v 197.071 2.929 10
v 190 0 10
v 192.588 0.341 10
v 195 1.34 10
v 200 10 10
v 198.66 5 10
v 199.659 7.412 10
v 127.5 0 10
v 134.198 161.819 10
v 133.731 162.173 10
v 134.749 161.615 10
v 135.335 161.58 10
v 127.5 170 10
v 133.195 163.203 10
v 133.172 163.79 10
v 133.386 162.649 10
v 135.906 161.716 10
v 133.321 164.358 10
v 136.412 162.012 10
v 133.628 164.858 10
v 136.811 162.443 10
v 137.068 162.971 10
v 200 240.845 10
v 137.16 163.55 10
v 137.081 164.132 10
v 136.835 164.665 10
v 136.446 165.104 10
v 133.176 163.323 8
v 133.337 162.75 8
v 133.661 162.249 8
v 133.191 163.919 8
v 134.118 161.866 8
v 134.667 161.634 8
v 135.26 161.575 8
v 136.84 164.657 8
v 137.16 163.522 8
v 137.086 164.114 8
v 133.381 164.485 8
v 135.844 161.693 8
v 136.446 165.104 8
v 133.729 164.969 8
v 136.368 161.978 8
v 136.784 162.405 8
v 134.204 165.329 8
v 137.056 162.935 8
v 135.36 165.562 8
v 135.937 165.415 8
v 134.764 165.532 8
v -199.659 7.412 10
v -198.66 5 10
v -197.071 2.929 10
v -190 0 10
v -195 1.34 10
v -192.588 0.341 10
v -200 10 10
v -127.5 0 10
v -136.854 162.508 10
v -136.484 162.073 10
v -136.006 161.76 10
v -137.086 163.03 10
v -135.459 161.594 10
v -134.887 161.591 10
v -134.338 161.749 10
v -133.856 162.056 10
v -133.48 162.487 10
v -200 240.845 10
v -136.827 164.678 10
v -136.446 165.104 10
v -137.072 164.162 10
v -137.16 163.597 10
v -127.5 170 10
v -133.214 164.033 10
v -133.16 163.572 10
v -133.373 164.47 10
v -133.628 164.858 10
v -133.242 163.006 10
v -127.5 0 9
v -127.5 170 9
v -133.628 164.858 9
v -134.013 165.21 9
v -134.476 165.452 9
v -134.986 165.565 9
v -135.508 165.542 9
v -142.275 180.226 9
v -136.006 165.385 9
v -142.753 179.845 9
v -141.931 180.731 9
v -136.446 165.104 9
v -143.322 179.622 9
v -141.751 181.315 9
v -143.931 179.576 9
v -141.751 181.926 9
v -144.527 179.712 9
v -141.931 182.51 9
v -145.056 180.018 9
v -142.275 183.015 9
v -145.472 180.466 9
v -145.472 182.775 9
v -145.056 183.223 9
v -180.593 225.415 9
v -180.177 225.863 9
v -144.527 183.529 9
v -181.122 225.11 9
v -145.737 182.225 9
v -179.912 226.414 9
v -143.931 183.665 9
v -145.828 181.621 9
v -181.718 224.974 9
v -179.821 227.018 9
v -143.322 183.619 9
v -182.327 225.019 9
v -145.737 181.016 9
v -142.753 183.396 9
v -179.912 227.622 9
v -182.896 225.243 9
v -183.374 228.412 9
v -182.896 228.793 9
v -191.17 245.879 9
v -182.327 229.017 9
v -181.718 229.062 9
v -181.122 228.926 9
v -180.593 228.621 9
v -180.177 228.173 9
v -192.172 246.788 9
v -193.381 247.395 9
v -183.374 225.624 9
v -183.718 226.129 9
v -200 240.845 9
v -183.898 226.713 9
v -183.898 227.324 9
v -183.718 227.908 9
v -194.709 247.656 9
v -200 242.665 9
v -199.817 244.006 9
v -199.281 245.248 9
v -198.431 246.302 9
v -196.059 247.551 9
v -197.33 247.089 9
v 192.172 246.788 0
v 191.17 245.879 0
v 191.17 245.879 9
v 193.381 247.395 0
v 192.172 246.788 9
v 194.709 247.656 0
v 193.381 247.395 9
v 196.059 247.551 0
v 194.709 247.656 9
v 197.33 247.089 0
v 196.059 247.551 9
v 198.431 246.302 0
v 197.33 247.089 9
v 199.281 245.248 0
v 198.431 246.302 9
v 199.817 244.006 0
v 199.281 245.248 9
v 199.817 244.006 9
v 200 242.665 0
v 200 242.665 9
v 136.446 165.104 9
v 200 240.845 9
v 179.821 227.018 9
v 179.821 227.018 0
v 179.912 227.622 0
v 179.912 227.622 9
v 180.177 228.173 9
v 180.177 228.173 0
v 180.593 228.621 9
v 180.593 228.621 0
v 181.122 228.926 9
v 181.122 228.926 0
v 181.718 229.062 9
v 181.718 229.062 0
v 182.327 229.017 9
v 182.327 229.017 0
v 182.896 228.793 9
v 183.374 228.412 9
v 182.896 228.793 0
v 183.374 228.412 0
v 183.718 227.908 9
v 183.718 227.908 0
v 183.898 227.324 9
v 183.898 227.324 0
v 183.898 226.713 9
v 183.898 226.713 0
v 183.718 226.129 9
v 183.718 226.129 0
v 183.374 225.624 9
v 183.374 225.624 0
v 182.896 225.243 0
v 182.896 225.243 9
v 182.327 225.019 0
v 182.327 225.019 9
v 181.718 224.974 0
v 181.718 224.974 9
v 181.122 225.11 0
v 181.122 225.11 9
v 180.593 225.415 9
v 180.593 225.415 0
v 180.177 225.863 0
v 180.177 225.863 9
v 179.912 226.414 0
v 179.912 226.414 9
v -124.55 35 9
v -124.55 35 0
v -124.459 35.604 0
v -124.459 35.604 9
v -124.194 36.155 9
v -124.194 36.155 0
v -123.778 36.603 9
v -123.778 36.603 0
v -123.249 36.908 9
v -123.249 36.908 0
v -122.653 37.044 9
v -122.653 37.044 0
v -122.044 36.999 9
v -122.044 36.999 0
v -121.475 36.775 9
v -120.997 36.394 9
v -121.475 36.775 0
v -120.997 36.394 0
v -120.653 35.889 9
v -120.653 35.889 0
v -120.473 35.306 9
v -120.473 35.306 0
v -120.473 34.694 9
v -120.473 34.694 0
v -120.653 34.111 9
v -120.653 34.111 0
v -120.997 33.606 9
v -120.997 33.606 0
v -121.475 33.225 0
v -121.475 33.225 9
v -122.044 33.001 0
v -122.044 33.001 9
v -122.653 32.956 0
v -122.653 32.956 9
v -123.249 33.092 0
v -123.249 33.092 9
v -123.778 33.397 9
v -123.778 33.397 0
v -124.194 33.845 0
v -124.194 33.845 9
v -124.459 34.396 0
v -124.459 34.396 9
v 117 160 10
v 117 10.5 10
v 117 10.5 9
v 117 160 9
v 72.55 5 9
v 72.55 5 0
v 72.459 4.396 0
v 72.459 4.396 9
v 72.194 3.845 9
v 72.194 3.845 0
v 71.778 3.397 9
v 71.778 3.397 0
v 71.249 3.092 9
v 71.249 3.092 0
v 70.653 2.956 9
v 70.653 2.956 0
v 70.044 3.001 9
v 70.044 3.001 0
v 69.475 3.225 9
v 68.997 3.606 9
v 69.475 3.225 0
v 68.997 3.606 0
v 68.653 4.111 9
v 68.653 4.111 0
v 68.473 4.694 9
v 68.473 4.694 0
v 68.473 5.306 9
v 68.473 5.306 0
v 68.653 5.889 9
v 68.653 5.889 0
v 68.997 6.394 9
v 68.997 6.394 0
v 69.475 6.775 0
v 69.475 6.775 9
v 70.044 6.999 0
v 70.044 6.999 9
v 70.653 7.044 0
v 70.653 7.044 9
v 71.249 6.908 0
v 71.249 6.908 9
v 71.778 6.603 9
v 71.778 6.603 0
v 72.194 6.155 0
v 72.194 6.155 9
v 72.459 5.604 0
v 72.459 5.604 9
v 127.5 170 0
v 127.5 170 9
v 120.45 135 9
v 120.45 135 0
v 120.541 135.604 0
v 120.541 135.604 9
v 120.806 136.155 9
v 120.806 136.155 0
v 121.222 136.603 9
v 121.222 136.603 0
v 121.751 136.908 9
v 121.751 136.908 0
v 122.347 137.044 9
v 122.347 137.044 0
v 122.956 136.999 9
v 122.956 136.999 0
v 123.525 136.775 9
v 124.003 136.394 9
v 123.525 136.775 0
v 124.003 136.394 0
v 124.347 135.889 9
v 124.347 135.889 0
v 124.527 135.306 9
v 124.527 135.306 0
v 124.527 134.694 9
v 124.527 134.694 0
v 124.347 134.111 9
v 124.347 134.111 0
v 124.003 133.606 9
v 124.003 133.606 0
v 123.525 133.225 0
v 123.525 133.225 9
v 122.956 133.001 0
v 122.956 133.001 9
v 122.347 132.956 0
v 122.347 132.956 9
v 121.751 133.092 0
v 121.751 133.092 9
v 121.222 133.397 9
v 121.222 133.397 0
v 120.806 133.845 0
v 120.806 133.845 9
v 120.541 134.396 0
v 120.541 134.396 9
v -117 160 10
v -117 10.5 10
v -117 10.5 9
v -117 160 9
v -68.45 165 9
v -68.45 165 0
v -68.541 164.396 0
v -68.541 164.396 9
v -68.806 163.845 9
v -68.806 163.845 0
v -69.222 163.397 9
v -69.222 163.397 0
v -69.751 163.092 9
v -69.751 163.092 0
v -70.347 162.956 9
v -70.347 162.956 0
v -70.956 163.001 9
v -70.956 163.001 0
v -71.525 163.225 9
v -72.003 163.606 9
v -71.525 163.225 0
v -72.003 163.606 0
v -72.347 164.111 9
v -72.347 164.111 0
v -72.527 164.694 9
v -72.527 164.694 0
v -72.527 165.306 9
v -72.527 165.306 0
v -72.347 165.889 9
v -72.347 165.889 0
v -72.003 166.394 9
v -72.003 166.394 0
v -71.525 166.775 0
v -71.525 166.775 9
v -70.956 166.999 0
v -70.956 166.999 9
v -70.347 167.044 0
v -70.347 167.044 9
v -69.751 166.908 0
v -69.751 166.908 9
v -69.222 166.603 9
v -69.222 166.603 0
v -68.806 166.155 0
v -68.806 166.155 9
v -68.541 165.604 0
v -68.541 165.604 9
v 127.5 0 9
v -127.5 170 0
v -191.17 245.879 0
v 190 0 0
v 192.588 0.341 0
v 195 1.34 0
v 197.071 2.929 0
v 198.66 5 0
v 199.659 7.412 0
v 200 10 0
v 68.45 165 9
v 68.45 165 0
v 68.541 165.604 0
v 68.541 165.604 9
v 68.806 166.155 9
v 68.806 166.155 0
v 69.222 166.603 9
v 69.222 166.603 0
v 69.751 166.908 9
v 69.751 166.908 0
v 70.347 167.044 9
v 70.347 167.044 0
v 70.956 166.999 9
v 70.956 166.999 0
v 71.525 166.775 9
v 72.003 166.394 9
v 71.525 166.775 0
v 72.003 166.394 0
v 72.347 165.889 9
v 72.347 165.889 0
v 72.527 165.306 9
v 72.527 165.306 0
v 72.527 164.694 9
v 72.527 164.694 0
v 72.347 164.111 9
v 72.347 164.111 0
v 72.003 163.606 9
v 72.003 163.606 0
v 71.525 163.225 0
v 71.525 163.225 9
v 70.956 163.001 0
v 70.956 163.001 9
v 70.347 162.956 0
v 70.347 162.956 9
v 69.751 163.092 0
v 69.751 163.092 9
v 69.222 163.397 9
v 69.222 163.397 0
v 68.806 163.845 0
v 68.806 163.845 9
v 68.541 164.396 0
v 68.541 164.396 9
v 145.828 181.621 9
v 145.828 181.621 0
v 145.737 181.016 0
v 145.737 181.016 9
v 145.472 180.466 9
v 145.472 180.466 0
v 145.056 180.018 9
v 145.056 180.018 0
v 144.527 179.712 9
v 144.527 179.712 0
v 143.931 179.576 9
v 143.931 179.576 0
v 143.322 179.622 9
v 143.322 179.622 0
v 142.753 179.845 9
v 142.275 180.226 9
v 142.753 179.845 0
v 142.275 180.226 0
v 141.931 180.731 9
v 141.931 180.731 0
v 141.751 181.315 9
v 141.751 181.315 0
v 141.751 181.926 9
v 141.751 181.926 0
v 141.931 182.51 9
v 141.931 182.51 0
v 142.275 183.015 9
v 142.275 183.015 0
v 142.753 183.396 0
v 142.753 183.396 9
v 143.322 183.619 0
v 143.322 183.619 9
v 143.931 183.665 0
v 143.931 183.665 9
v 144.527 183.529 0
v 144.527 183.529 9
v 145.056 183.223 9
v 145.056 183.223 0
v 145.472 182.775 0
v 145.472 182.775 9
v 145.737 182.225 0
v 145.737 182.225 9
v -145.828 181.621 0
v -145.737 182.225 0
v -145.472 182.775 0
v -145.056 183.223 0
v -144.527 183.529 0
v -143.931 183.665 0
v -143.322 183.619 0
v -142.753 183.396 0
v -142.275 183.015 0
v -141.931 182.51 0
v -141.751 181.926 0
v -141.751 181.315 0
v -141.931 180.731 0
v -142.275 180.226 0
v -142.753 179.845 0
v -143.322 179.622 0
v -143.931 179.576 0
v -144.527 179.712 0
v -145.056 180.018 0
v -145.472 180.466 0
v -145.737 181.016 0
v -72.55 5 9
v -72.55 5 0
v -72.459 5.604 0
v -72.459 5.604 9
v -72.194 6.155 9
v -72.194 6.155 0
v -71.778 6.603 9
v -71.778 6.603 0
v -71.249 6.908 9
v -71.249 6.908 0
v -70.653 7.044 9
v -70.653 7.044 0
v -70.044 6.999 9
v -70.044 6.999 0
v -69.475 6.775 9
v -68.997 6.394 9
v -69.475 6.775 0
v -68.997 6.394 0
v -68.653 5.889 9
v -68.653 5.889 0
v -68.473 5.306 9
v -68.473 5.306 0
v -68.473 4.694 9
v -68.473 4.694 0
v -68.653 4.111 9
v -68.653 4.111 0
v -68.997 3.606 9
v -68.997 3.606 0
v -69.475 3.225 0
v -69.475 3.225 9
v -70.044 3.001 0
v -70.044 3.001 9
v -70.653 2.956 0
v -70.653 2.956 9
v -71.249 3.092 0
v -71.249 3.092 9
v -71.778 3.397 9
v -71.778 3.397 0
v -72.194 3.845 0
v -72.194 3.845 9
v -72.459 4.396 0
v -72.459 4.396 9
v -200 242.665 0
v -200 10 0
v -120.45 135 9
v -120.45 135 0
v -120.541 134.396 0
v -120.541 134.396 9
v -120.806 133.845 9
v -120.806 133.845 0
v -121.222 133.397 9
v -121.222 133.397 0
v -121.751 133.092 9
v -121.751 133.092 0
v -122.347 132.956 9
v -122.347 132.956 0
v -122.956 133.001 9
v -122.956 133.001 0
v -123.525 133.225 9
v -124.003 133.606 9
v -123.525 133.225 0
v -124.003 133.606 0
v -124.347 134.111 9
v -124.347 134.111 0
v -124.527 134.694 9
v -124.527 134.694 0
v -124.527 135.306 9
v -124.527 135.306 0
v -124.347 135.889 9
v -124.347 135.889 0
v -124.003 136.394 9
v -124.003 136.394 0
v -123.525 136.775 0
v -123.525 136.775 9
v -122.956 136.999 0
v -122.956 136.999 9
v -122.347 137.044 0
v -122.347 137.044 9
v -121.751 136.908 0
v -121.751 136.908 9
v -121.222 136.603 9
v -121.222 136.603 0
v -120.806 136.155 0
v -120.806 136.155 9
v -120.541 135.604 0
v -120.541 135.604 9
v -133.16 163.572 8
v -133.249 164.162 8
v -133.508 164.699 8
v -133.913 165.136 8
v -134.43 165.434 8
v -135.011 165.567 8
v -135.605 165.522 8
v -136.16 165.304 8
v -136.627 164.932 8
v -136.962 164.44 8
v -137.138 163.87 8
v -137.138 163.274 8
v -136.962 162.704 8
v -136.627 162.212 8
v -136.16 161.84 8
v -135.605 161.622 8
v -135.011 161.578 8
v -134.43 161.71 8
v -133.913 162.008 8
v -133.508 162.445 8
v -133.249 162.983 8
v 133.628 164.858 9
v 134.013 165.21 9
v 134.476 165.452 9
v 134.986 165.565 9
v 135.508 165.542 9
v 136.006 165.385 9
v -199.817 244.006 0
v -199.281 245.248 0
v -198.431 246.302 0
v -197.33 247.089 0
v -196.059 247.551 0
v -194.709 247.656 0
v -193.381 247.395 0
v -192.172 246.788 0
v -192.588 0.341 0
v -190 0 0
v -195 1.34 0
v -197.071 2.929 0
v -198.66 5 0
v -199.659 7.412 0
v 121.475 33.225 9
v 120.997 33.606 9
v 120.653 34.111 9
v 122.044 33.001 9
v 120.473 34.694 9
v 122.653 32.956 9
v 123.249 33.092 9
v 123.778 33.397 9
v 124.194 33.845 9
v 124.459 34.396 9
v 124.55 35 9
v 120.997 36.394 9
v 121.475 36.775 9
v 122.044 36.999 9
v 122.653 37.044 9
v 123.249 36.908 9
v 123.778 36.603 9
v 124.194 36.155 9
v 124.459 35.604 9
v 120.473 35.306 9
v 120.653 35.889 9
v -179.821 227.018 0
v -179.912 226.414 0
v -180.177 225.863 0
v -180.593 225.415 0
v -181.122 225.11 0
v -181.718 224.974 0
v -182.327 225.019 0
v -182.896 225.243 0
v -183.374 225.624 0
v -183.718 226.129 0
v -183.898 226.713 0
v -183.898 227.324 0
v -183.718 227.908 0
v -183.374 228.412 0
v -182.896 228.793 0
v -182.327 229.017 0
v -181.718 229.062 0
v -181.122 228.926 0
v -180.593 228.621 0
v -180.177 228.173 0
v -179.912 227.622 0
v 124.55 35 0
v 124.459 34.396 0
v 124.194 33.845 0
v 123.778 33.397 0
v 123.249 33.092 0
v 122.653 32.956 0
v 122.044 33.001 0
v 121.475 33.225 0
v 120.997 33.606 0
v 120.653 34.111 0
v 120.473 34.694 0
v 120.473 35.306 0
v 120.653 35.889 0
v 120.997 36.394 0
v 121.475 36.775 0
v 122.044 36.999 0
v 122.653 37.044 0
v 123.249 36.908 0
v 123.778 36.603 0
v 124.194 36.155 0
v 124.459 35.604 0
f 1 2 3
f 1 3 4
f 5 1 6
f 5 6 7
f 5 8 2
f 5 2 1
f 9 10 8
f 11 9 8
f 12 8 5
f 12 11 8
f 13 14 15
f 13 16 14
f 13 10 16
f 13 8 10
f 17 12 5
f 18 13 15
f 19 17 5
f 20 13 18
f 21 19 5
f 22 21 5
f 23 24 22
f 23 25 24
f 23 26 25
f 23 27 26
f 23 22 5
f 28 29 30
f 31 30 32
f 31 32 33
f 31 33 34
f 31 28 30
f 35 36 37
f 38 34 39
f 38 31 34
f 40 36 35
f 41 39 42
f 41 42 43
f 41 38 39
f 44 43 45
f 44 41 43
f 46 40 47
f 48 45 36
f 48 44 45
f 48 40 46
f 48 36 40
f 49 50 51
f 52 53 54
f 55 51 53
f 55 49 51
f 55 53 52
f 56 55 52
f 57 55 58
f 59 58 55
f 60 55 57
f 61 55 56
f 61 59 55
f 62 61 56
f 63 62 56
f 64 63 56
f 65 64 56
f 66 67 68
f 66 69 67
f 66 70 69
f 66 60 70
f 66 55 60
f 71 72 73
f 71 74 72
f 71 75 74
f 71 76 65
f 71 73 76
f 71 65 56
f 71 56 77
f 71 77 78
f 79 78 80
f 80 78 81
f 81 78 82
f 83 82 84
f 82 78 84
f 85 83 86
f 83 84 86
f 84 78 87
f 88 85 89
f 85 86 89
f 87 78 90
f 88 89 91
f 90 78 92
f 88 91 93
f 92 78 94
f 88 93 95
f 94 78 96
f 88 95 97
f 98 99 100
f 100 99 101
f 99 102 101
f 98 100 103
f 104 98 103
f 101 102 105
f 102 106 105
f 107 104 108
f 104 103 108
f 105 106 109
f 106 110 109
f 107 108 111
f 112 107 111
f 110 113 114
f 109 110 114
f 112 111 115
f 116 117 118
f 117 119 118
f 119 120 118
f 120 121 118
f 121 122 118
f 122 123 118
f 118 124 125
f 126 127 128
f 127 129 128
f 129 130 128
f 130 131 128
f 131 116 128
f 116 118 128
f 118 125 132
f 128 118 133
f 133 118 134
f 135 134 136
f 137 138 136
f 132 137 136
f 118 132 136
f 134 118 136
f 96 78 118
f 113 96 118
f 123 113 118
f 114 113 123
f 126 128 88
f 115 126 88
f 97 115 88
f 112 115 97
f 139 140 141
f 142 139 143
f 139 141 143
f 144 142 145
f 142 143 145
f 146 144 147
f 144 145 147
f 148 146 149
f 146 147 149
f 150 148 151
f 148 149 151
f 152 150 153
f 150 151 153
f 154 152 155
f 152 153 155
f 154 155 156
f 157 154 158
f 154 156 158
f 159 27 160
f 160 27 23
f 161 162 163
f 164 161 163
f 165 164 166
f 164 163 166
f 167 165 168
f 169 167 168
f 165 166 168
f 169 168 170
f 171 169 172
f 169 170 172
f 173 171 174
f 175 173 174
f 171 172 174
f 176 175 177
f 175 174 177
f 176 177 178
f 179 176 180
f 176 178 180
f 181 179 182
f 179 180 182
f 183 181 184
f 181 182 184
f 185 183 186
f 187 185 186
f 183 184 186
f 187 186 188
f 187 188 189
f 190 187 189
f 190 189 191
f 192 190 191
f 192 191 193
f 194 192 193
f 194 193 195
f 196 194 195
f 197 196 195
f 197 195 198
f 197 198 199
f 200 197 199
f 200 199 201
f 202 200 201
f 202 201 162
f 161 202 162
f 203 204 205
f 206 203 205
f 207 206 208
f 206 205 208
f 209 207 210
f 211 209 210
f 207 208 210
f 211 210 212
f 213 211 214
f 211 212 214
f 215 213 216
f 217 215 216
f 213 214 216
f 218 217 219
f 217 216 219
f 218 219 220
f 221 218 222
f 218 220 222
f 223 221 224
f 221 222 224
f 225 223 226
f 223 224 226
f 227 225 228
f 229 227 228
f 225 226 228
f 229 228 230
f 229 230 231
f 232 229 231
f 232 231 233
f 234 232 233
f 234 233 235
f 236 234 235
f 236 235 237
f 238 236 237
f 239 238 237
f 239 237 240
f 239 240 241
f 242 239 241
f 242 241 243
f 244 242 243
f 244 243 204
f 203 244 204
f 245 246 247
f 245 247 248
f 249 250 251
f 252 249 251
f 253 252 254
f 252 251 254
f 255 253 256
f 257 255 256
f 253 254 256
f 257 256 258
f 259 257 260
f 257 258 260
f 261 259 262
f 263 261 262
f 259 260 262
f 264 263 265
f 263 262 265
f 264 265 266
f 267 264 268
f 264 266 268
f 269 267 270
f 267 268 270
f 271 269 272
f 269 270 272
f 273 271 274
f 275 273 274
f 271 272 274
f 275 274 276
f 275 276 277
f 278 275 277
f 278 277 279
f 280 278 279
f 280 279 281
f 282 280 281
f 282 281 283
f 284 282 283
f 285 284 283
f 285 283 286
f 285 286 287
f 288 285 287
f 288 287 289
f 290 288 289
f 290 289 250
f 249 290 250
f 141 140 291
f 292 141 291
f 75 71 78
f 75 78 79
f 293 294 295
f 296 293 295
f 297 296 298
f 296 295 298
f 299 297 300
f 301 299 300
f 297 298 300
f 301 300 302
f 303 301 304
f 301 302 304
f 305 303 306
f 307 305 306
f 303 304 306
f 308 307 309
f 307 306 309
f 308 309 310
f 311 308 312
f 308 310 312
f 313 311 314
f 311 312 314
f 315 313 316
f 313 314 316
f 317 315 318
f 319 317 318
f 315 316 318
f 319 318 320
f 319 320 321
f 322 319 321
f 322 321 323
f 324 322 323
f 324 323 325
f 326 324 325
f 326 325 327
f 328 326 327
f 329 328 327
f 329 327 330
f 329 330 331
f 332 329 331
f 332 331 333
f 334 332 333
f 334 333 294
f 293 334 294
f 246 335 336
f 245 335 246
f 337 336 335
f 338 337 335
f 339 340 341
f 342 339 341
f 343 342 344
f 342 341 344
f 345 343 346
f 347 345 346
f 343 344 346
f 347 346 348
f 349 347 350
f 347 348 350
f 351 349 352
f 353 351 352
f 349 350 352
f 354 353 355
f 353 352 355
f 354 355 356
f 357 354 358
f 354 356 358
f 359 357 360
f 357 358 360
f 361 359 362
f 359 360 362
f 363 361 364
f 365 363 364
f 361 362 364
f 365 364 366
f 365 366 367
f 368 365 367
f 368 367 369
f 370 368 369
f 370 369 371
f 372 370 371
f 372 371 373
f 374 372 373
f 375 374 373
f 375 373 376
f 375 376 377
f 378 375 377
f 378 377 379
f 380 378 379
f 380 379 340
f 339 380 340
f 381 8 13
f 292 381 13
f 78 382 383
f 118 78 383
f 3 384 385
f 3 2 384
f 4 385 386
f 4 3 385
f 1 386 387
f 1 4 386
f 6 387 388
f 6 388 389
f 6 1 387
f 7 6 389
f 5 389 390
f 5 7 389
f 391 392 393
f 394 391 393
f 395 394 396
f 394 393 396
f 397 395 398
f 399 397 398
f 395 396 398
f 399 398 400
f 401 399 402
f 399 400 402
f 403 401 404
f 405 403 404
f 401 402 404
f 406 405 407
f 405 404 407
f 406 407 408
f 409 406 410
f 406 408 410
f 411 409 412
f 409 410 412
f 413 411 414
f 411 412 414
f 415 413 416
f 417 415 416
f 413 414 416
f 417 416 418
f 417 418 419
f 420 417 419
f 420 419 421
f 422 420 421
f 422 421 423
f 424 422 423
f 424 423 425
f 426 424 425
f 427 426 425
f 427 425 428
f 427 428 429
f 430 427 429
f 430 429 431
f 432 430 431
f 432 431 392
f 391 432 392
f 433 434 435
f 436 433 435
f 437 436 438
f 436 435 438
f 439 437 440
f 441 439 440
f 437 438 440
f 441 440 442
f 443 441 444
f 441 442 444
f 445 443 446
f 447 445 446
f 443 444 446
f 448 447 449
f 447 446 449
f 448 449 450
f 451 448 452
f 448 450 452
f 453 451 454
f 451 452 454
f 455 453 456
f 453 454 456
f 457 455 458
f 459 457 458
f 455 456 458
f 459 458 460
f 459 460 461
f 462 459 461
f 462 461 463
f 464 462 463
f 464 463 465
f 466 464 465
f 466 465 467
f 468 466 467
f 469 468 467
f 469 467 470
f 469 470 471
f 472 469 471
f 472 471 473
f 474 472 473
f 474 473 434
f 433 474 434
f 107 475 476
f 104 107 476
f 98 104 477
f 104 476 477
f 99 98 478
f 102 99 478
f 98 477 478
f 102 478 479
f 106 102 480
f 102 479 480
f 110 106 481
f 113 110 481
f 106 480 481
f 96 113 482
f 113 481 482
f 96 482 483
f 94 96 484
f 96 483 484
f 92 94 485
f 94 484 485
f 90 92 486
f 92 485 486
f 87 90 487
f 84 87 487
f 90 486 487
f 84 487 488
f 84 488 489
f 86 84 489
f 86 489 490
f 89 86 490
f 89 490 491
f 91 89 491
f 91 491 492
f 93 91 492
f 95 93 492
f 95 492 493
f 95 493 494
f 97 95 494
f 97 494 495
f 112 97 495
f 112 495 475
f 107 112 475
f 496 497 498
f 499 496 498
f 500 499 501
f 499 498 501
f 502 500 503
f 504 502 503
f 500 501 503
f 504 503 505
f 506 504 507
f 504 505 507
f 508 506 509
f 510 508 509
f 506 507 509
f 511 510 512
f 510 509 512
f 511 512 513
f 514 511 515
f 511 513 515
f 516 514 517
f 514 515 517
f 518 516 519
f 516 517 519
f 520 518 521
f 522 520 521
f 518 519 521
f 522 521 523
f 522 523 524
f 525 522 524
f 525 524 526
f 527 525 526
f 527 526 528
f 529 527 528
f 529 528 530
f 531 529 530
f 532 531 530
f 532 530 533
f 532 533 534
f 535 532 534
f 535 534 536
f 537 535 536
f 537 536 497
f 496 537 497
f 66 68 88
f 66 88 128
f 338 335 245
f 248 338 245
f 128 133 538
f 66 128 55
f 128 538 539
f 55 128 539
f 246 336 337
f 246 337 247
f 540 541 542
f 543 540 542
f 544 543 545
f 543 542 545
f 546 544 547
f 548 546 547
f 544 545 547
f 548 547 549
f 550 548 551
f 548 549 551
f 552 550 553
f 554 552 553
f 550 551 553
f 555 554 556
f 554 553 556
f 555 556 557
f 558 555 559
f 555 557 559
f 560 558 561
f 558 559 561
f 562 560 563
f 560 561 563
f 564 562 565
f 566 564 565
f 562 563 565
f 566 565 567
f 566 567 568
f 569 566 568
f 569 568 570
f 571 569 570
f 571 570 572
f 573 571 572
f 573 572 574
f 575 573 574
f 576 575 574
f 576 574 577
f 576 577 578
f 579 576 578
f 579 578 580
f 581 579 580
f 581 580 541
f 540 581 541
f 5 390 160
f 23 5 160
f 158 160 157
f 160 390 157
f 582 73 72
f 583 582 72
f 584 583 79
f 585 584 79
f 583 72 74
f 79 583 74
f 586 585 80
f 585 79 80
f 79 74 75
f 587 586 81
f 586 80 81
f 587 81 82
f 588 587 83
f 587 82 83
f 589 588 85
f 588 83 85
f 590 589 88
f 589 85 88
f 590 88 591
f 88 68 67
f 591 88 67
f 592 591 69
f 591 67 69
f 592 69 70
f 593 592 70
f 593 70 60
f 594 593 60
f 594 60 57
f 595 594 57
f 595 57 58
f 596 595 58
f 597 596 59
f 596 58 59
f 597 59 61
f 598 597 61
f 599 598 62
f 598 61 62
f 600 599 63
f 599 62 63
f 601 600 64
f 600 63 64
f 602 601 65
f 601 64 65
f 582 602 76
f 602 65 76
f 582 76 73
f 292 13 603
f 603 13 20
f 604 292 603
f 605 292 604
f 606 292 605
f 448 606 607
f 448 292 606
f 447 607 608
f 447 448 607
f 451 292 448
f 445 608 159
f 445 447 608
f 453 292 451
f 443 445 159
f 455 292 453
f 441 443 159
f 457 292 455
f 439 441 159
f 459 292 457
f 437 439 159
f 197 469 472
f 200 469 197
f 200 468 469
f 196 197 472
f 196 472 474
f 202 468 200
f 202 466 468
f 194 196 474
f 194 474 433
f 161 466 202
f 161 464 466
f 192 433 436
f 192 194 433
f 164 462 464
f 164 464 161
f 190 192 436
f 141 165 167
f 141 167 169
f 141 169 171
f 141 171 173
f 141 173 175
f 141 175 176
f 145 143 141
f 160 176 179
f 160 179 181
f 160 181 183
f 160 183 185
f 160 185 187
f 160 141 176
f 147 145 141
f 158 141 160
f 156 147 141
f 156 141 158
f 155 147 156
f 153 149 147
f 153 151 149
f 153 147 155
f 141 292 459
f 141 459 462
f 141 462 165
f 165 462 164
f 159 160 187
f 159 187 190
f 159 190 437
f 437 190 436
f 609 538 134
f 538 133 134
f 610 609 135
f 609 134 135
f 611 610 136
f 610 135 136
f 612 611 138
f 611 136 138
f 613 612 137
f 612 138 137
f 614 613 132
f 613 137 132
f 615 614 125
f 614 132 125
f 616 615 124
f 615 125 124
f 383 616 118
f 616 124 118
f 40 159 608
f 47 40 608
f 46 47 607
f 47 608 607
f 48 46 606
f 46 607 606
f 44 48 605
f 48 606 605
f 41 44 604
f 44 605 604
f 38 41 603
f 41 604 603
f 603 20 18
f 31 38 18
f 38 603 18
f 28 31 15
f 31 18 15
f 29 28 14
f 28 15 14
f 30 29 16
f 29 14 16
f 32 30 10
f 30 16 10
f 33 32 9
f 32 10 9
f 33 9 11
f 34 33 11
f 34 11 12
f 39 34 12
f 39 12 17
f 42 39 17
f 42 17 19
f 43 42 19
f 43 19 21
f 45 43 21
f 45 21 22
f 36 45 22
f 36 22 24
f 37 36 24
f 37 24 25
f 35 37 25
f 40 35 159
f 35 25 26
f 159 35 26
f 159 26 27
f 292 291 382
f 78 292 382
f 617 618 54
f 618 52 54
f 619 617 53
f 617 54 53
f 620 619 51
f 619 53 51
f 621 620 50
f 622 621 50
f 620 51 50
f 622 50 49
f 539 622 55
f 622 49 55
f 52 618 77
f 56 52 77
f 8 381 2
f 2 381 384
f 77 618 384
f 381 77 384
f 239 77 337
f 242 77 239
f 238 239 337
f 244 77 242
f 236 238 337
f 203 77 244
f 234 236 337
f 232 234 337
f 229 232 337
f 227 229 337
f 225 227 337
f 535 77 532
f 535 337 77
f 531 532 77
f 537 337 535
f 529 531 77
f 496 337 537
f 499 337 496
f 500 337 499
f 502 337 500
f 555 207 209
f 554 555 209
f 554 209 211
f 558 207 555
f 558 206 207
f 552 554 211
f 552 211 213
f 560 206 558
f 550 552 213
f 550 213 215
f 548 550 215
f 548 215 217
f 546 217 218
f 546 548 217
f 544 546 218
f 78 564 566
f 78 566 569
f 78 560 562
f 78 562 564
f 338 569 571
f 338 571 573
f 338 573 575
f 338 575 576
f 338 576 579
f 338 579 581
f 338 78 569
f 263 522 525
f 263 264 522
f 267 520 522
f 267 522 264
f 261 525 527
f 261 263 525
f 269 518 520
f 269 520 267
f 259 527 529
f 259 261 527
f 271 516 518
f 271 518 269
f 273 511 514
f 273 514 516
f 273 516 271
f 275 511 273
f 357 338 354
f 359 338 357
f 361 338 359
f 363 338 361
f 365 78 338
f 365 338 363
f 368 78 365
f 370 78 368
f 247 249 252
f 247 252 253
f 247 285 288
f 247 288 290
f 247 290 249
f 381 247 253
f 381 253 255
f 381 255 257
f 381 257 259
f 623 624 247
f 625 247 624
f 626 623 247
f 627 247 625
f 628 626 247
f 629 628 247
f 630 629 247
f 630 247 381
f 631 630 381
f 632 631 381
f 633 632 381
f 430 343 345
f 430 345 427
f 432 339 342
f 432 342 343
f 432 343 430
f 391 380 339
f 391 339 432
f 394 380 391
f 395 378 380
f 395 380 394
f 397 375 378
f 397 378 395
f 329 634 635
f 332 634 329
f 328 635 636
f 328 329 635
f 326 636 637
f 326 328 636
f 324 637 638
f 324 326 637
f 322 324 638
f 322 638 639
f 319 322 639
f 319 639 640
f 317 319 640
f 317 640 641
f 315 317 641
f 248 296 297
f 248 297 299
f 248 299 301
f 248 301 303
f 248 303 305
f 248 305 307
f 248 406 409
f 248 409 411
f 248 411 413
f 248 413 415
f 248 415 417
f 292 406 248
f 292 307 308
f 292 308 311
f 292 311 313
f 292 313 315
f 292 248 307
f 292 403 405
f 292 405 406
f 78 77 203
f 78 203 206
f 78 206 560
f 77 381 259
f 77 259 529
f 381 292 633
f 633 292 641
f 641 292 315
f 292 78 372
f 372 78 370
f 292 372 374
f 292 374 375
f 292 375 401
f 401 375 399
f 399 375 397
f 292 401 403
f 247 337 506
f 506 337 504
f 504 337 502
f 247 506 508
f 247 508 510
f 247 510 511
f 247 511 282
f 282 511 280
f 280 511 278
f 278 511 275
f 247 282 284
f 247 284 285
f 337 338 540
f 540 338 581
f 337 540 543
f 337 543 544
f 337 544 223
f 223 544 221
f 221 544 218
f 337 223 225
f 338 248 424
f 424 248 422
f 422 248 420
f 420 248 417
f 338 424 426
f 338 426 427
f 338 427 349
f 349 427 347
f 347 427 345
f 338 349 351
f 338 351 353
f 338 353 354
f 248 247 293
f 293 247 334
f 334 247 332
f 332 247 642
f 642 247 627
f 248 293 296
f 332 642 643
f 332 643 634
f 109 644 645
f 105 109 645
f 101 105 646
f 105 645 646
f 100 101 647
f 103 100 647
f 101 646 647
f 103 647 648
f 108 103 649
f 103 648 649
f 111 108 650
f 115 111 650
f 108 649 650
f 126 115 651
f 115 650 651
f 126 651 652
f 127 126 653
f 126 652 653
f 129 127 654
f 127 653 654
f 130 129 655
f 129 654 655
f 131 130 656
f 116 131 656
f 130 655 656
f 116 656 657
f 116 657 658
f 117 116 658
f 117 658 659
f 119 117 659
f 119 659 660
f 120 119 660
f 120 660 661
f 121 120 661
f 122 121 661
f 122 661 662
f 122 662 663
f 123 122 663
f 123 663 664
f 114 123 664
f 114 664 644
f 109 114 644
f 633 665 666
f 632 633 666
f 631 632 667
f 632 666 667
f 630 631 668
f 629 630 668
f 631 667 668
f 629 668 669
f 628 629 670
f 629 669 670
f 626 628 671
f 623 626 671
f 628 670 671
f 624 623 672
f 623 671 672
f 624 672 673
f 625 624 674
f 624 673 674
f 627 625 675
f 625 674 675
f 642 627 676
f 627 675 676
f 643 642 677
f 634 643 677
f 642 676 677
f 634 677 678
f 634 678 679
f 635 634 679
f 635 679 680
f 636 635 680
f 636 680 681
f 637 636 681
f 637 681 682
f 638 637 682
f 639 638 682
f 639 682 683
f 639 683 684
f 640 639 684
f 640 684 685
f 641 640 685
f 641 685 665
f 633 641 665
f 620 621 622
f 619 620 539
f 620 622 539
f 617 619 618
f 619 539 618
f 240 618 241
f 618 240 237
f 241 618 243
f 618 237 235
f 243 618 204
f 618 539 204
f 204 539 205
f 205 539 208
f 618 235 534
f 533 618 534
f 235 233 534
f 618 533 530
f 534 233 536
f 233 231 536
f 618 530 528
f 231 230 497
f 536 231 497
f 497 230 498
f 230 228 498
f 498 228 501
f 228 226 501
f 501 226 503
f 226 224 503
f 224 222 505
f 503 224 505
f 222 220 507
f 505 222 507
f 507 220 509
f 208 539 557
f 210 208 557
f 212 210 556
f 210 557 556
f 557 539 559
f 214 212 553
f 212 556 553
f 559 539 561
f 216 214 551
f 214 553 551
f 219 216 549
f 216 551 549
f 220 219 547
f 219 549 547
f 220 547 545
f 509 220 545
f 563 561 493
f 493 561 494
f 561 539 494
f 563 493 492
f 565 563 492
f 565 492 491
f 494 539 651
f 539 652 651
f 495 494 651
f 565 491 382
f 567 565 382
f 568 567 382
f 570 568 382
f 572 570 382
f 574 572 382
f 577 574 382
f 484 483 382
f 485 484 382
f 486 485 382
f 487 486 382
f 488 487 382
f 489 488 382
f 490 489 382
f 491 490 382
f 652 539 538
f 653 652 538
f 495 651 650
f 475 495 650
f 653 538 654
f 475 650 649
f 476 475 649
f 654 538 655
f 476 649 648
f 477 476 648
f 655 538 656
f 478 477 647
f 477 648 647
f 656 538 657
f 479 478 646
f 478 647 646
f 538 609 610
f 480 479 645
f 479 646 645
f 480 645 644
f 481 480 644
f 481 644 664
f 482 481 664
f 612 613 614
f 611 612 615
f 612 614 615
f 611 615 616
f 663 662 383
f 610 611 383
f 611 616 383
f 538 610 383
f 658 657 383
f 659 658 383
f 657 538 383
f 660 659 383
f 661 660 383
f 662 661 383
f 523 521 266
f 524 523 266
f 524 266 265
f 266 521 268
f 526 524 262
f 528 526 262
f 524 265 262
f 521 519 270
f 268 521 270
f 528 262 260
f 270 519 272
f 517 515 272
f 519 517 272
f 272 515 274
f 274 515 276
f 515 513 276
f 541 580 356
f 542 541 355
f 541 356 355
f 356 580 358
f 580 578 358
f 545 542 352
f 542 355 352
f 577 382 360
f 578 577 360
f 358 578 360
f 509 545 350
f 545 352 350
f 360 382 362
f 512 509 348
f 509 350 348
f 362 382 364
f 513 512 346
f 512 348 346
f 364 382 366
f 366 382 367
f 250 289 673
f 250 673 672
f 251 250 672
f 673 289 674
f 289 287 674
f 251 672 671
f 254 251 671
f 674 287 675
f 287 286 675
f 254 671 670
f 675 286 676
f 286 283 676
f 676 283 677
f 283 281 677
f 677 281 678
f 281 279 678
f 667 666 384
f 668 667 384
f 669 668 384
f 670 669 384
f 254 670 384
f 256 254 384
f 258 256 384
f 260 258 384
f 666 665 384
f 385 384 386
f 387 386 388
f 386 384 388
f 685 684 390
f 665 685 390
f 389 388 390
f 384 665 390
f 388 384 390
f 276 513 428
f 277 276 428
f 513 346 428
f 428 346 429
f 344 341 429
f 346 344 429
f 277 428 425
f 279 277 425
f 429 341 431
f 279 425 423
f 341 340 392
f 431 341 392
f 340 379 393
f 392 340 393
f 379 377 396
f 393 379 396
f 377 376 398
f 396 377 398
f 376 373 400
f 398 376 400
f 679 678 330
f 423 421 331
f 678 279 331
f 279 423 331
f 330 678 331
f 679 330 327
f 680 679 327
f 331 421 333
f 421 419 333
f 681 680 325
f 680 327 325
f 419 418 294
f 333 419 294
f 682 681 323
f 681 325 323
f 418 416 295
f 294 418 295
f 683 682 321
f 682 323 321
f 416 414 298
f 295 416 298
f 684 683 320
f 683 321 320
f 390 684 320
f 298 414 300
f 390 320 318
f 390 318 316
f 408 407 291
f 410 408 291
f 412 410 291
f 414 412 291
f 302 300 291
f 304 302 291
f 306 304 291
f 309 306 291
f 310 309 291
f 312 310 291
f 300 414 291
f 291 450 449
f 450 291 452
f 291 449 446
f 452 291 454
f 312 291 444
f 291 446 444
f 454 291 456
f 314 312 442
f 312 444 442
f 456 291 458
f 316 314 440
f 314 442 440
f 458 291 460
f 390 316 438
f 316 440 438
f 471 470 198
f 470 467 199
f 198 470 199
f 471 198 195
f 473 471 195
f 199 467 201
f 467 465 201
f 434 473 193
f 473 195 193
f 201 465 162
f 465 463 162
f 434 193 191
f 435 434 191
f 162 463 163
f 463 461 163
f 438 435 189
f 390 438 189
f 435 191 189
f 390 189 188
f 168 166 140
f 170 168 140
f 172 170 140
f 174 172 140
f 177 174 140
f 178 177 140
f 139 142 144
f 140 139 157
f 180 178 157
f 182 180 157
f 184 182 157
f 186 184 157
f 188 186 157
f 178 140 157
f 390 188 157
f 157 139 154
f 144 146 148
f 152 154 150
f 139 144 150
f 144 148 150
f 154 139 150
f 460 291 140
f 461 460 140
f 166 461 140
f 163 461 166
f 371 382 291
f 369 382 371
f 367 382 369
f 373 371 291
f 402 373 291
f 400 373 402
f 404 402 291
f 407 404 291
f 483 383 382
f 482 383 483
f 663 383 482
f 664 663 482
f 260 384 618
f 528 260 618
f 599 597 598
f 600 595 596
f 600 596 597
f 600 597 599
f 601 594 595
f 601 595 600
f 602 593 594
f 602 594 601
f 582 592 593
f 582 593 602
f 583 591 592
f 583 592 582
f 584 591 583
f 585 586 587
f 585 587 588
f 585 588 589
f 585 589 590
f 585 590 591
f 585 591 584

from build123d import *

# Parameters (mm, degrees)
BOSS_EXTRUDE2_DEPTH     = 10
ESQUISSE2_W             = 255
ESQUISSE2_H             = 170
ESQUISSE2_W_2           = 234
ESQUISSE2_H_2           = 149.5
ENL_V_MAT_EXTRU_1_DEPTH = 1
ENL_V_MAT_EXTRU_2_DEPTH = 1
CONG_1_R                = 10
CONG_2_R                = 10
CONG_3_R                = 5
CONG_4_R                = 5
ESQUISSE5_R             = 2
ENL_V_MAT_EXTRU_3_DEPTH = 2
ESQUISSE6_R             = 2.05
ENL_V_MAT_EXTRU_4_DEPTH = 10
ESQUISSE7_R             = 2.05
ENL_V_MAT_EXTRU_5_DEPTH = 10


with BuildPart() as part:
    # Sketch1 → Boss-Extrude2 (new body)
    with BuildSketch(Plane.XY):
        Polygon((-200, 0), (200, 0), (200, 170), (200, 256.402135463), (127.5, 170), (-127.5, 170), (-200, 256.402135463), (-200, 170), align=None)
    extrude(amount=BOSS_EXTRUDE2_DEPTH)

    # Esquisse2 → Enlèv. mat.-Extru.1 (cut)
    with BuildSketch(Plane.XY.offset(10)):
        with Locations((0, 85)):
            Rectangle(ESQUISSE2_W, ESQUISSE2_H)
        with Locations((0, 85.25)):
            Rectangle(ESQUISSE2_W_2, ESQUISSE2_H_2, mode=Mode.SUBTRACT)
    extrude(amount=-ENL_V_MAT_EXTRU_1_DEPTH, mode=Mode.SUBTRACT)

    # Esquisse3 → Enlèv. mat.-Extru.2 (cut)
    with BuildSketch(Plane.XY.offset(10)):
        Polygon((127.5, 170), (135.160444431, 163.572123903), (200, 240.844897194), (200, 256.402135463), align=None)
        Polygon((-200, 256.402135463), (-127.5, 170), (-135.160444431, 163.572123903), (-200, 240.844897194), align=None)
    extrude(amount=-ENL_V_MAT_EXTRU_2_DEPTH, mode=Mode.SUBTRACT)

    # Congé1
    cong_1_edges = [part.edges().sort_by_distance(p)[0] for p in [
        (200, 0, 5),
    ]]
    fillet(cong_1_edges, radius=CONG_1_R)

    # Congé2
    cong_2_edges = [part.edges().sort_by_distance(p)[0] for p in [
        (-200, 0, 5),
    ]]
    fillet(cong_2_edges, radius=CONG_2_R)

    # Congé3
    cong_3_edges = [part.edges().sort_by_distance(p)[0] for p in [
        (-200, 256.402135463, 4.5),
    ]]
    fillet(cong_3_edges, radius=CONG_3_R)

    # Congé4
    cong_4_edges = [part.edges().sort_by_distance(p)[0] for p in [
        (200, 256.402135463, 4.5),
    ]]
    fillet(cong_4_edges, radius=CONG_4_R)

    # Esquisse5 → Enlèv. mat.-Extru.3 (cut)
    with BuildSketch(Plane.XY.offset(10)):
        with Locations((-135.160444431, 163.572123903)):
            Circle(ESQUISSE5_R)
        with Locations(Location((135.160444431, 163.572123903, 0), (0, 0, 50))):
            Circle(ESQUISSE5_R)
    extrude(amount=-ENL_V_MAT_EXTRU_3_DEPTH, mode=Mode.SUBTRACT)

    # Esquisse6 → Enlèv. mat.-Extru.4 (cut)
    with BuildSketch(Plane(origin=(0, 0, 0), x_dir=(-1, 0, 0), z_dir=(0, 0, -1))):
        with Locations((-70.5, 165)):
            Circle(ESQUISSE6_R)
        with Locations((-122.5, 135)):
            Circle(ESQUISSE6_R)
        with Locations(Location((122.5, 135, 0), (0, 0, 180))):
            Circle(ESQUISSE6_R)
        with Locations(Location((70.5, 165, 0), (0, 0, 180))):
            Circle(ESQUISSE6_R)
        with Locations((70.5, 5)):
            Circle(ESQUISSE6_R)
        with Locations((122.5, 35)):
            Circle(ESQUISSE6_R)
        with Locations(Location((-122.5, 35, 0), (0, 0, 180))):
            Circle(ESQUISSE6_R)
        with Locations(Location((-70.5, 5, 0), (0, 0, 180))):
            Circle(ESQUISSE6_R)
    extrude(amount=-ENL_V_MAT_EXTRU_4_DEPTH, mode=Mode.SUBTRACT)

    # Esquisse7 → Enlèv. mat.-Extru.5 (cut)
    with BuildSketch(Plane(origin=(0, 0, 0), x_dir=(-1, 0, 0), z_dir=(0, 0, -1))):
        with Locations((143.777848565, 181.620565373)):
            Circle(ESQUISSE7_R)
        with Locations(Location((181.870852493, 227.018039657, 0), (0, 0, 180))):
            Circle(ESQUISSE7_R)
        with Locations((-181.870852493, 227.018039657)):
            Circle(ESQUISSE7_R)
        with Locations(Location((-143.777848565, 181.620565373, 0), (0, 0, 180))):
            Circle(ESQUISSE7_R)
    extrude(amount=-ENL_V_MAT_EXTRU_5_DEPTH, mode=Mode.SUBTRACT)


solid = part.part
